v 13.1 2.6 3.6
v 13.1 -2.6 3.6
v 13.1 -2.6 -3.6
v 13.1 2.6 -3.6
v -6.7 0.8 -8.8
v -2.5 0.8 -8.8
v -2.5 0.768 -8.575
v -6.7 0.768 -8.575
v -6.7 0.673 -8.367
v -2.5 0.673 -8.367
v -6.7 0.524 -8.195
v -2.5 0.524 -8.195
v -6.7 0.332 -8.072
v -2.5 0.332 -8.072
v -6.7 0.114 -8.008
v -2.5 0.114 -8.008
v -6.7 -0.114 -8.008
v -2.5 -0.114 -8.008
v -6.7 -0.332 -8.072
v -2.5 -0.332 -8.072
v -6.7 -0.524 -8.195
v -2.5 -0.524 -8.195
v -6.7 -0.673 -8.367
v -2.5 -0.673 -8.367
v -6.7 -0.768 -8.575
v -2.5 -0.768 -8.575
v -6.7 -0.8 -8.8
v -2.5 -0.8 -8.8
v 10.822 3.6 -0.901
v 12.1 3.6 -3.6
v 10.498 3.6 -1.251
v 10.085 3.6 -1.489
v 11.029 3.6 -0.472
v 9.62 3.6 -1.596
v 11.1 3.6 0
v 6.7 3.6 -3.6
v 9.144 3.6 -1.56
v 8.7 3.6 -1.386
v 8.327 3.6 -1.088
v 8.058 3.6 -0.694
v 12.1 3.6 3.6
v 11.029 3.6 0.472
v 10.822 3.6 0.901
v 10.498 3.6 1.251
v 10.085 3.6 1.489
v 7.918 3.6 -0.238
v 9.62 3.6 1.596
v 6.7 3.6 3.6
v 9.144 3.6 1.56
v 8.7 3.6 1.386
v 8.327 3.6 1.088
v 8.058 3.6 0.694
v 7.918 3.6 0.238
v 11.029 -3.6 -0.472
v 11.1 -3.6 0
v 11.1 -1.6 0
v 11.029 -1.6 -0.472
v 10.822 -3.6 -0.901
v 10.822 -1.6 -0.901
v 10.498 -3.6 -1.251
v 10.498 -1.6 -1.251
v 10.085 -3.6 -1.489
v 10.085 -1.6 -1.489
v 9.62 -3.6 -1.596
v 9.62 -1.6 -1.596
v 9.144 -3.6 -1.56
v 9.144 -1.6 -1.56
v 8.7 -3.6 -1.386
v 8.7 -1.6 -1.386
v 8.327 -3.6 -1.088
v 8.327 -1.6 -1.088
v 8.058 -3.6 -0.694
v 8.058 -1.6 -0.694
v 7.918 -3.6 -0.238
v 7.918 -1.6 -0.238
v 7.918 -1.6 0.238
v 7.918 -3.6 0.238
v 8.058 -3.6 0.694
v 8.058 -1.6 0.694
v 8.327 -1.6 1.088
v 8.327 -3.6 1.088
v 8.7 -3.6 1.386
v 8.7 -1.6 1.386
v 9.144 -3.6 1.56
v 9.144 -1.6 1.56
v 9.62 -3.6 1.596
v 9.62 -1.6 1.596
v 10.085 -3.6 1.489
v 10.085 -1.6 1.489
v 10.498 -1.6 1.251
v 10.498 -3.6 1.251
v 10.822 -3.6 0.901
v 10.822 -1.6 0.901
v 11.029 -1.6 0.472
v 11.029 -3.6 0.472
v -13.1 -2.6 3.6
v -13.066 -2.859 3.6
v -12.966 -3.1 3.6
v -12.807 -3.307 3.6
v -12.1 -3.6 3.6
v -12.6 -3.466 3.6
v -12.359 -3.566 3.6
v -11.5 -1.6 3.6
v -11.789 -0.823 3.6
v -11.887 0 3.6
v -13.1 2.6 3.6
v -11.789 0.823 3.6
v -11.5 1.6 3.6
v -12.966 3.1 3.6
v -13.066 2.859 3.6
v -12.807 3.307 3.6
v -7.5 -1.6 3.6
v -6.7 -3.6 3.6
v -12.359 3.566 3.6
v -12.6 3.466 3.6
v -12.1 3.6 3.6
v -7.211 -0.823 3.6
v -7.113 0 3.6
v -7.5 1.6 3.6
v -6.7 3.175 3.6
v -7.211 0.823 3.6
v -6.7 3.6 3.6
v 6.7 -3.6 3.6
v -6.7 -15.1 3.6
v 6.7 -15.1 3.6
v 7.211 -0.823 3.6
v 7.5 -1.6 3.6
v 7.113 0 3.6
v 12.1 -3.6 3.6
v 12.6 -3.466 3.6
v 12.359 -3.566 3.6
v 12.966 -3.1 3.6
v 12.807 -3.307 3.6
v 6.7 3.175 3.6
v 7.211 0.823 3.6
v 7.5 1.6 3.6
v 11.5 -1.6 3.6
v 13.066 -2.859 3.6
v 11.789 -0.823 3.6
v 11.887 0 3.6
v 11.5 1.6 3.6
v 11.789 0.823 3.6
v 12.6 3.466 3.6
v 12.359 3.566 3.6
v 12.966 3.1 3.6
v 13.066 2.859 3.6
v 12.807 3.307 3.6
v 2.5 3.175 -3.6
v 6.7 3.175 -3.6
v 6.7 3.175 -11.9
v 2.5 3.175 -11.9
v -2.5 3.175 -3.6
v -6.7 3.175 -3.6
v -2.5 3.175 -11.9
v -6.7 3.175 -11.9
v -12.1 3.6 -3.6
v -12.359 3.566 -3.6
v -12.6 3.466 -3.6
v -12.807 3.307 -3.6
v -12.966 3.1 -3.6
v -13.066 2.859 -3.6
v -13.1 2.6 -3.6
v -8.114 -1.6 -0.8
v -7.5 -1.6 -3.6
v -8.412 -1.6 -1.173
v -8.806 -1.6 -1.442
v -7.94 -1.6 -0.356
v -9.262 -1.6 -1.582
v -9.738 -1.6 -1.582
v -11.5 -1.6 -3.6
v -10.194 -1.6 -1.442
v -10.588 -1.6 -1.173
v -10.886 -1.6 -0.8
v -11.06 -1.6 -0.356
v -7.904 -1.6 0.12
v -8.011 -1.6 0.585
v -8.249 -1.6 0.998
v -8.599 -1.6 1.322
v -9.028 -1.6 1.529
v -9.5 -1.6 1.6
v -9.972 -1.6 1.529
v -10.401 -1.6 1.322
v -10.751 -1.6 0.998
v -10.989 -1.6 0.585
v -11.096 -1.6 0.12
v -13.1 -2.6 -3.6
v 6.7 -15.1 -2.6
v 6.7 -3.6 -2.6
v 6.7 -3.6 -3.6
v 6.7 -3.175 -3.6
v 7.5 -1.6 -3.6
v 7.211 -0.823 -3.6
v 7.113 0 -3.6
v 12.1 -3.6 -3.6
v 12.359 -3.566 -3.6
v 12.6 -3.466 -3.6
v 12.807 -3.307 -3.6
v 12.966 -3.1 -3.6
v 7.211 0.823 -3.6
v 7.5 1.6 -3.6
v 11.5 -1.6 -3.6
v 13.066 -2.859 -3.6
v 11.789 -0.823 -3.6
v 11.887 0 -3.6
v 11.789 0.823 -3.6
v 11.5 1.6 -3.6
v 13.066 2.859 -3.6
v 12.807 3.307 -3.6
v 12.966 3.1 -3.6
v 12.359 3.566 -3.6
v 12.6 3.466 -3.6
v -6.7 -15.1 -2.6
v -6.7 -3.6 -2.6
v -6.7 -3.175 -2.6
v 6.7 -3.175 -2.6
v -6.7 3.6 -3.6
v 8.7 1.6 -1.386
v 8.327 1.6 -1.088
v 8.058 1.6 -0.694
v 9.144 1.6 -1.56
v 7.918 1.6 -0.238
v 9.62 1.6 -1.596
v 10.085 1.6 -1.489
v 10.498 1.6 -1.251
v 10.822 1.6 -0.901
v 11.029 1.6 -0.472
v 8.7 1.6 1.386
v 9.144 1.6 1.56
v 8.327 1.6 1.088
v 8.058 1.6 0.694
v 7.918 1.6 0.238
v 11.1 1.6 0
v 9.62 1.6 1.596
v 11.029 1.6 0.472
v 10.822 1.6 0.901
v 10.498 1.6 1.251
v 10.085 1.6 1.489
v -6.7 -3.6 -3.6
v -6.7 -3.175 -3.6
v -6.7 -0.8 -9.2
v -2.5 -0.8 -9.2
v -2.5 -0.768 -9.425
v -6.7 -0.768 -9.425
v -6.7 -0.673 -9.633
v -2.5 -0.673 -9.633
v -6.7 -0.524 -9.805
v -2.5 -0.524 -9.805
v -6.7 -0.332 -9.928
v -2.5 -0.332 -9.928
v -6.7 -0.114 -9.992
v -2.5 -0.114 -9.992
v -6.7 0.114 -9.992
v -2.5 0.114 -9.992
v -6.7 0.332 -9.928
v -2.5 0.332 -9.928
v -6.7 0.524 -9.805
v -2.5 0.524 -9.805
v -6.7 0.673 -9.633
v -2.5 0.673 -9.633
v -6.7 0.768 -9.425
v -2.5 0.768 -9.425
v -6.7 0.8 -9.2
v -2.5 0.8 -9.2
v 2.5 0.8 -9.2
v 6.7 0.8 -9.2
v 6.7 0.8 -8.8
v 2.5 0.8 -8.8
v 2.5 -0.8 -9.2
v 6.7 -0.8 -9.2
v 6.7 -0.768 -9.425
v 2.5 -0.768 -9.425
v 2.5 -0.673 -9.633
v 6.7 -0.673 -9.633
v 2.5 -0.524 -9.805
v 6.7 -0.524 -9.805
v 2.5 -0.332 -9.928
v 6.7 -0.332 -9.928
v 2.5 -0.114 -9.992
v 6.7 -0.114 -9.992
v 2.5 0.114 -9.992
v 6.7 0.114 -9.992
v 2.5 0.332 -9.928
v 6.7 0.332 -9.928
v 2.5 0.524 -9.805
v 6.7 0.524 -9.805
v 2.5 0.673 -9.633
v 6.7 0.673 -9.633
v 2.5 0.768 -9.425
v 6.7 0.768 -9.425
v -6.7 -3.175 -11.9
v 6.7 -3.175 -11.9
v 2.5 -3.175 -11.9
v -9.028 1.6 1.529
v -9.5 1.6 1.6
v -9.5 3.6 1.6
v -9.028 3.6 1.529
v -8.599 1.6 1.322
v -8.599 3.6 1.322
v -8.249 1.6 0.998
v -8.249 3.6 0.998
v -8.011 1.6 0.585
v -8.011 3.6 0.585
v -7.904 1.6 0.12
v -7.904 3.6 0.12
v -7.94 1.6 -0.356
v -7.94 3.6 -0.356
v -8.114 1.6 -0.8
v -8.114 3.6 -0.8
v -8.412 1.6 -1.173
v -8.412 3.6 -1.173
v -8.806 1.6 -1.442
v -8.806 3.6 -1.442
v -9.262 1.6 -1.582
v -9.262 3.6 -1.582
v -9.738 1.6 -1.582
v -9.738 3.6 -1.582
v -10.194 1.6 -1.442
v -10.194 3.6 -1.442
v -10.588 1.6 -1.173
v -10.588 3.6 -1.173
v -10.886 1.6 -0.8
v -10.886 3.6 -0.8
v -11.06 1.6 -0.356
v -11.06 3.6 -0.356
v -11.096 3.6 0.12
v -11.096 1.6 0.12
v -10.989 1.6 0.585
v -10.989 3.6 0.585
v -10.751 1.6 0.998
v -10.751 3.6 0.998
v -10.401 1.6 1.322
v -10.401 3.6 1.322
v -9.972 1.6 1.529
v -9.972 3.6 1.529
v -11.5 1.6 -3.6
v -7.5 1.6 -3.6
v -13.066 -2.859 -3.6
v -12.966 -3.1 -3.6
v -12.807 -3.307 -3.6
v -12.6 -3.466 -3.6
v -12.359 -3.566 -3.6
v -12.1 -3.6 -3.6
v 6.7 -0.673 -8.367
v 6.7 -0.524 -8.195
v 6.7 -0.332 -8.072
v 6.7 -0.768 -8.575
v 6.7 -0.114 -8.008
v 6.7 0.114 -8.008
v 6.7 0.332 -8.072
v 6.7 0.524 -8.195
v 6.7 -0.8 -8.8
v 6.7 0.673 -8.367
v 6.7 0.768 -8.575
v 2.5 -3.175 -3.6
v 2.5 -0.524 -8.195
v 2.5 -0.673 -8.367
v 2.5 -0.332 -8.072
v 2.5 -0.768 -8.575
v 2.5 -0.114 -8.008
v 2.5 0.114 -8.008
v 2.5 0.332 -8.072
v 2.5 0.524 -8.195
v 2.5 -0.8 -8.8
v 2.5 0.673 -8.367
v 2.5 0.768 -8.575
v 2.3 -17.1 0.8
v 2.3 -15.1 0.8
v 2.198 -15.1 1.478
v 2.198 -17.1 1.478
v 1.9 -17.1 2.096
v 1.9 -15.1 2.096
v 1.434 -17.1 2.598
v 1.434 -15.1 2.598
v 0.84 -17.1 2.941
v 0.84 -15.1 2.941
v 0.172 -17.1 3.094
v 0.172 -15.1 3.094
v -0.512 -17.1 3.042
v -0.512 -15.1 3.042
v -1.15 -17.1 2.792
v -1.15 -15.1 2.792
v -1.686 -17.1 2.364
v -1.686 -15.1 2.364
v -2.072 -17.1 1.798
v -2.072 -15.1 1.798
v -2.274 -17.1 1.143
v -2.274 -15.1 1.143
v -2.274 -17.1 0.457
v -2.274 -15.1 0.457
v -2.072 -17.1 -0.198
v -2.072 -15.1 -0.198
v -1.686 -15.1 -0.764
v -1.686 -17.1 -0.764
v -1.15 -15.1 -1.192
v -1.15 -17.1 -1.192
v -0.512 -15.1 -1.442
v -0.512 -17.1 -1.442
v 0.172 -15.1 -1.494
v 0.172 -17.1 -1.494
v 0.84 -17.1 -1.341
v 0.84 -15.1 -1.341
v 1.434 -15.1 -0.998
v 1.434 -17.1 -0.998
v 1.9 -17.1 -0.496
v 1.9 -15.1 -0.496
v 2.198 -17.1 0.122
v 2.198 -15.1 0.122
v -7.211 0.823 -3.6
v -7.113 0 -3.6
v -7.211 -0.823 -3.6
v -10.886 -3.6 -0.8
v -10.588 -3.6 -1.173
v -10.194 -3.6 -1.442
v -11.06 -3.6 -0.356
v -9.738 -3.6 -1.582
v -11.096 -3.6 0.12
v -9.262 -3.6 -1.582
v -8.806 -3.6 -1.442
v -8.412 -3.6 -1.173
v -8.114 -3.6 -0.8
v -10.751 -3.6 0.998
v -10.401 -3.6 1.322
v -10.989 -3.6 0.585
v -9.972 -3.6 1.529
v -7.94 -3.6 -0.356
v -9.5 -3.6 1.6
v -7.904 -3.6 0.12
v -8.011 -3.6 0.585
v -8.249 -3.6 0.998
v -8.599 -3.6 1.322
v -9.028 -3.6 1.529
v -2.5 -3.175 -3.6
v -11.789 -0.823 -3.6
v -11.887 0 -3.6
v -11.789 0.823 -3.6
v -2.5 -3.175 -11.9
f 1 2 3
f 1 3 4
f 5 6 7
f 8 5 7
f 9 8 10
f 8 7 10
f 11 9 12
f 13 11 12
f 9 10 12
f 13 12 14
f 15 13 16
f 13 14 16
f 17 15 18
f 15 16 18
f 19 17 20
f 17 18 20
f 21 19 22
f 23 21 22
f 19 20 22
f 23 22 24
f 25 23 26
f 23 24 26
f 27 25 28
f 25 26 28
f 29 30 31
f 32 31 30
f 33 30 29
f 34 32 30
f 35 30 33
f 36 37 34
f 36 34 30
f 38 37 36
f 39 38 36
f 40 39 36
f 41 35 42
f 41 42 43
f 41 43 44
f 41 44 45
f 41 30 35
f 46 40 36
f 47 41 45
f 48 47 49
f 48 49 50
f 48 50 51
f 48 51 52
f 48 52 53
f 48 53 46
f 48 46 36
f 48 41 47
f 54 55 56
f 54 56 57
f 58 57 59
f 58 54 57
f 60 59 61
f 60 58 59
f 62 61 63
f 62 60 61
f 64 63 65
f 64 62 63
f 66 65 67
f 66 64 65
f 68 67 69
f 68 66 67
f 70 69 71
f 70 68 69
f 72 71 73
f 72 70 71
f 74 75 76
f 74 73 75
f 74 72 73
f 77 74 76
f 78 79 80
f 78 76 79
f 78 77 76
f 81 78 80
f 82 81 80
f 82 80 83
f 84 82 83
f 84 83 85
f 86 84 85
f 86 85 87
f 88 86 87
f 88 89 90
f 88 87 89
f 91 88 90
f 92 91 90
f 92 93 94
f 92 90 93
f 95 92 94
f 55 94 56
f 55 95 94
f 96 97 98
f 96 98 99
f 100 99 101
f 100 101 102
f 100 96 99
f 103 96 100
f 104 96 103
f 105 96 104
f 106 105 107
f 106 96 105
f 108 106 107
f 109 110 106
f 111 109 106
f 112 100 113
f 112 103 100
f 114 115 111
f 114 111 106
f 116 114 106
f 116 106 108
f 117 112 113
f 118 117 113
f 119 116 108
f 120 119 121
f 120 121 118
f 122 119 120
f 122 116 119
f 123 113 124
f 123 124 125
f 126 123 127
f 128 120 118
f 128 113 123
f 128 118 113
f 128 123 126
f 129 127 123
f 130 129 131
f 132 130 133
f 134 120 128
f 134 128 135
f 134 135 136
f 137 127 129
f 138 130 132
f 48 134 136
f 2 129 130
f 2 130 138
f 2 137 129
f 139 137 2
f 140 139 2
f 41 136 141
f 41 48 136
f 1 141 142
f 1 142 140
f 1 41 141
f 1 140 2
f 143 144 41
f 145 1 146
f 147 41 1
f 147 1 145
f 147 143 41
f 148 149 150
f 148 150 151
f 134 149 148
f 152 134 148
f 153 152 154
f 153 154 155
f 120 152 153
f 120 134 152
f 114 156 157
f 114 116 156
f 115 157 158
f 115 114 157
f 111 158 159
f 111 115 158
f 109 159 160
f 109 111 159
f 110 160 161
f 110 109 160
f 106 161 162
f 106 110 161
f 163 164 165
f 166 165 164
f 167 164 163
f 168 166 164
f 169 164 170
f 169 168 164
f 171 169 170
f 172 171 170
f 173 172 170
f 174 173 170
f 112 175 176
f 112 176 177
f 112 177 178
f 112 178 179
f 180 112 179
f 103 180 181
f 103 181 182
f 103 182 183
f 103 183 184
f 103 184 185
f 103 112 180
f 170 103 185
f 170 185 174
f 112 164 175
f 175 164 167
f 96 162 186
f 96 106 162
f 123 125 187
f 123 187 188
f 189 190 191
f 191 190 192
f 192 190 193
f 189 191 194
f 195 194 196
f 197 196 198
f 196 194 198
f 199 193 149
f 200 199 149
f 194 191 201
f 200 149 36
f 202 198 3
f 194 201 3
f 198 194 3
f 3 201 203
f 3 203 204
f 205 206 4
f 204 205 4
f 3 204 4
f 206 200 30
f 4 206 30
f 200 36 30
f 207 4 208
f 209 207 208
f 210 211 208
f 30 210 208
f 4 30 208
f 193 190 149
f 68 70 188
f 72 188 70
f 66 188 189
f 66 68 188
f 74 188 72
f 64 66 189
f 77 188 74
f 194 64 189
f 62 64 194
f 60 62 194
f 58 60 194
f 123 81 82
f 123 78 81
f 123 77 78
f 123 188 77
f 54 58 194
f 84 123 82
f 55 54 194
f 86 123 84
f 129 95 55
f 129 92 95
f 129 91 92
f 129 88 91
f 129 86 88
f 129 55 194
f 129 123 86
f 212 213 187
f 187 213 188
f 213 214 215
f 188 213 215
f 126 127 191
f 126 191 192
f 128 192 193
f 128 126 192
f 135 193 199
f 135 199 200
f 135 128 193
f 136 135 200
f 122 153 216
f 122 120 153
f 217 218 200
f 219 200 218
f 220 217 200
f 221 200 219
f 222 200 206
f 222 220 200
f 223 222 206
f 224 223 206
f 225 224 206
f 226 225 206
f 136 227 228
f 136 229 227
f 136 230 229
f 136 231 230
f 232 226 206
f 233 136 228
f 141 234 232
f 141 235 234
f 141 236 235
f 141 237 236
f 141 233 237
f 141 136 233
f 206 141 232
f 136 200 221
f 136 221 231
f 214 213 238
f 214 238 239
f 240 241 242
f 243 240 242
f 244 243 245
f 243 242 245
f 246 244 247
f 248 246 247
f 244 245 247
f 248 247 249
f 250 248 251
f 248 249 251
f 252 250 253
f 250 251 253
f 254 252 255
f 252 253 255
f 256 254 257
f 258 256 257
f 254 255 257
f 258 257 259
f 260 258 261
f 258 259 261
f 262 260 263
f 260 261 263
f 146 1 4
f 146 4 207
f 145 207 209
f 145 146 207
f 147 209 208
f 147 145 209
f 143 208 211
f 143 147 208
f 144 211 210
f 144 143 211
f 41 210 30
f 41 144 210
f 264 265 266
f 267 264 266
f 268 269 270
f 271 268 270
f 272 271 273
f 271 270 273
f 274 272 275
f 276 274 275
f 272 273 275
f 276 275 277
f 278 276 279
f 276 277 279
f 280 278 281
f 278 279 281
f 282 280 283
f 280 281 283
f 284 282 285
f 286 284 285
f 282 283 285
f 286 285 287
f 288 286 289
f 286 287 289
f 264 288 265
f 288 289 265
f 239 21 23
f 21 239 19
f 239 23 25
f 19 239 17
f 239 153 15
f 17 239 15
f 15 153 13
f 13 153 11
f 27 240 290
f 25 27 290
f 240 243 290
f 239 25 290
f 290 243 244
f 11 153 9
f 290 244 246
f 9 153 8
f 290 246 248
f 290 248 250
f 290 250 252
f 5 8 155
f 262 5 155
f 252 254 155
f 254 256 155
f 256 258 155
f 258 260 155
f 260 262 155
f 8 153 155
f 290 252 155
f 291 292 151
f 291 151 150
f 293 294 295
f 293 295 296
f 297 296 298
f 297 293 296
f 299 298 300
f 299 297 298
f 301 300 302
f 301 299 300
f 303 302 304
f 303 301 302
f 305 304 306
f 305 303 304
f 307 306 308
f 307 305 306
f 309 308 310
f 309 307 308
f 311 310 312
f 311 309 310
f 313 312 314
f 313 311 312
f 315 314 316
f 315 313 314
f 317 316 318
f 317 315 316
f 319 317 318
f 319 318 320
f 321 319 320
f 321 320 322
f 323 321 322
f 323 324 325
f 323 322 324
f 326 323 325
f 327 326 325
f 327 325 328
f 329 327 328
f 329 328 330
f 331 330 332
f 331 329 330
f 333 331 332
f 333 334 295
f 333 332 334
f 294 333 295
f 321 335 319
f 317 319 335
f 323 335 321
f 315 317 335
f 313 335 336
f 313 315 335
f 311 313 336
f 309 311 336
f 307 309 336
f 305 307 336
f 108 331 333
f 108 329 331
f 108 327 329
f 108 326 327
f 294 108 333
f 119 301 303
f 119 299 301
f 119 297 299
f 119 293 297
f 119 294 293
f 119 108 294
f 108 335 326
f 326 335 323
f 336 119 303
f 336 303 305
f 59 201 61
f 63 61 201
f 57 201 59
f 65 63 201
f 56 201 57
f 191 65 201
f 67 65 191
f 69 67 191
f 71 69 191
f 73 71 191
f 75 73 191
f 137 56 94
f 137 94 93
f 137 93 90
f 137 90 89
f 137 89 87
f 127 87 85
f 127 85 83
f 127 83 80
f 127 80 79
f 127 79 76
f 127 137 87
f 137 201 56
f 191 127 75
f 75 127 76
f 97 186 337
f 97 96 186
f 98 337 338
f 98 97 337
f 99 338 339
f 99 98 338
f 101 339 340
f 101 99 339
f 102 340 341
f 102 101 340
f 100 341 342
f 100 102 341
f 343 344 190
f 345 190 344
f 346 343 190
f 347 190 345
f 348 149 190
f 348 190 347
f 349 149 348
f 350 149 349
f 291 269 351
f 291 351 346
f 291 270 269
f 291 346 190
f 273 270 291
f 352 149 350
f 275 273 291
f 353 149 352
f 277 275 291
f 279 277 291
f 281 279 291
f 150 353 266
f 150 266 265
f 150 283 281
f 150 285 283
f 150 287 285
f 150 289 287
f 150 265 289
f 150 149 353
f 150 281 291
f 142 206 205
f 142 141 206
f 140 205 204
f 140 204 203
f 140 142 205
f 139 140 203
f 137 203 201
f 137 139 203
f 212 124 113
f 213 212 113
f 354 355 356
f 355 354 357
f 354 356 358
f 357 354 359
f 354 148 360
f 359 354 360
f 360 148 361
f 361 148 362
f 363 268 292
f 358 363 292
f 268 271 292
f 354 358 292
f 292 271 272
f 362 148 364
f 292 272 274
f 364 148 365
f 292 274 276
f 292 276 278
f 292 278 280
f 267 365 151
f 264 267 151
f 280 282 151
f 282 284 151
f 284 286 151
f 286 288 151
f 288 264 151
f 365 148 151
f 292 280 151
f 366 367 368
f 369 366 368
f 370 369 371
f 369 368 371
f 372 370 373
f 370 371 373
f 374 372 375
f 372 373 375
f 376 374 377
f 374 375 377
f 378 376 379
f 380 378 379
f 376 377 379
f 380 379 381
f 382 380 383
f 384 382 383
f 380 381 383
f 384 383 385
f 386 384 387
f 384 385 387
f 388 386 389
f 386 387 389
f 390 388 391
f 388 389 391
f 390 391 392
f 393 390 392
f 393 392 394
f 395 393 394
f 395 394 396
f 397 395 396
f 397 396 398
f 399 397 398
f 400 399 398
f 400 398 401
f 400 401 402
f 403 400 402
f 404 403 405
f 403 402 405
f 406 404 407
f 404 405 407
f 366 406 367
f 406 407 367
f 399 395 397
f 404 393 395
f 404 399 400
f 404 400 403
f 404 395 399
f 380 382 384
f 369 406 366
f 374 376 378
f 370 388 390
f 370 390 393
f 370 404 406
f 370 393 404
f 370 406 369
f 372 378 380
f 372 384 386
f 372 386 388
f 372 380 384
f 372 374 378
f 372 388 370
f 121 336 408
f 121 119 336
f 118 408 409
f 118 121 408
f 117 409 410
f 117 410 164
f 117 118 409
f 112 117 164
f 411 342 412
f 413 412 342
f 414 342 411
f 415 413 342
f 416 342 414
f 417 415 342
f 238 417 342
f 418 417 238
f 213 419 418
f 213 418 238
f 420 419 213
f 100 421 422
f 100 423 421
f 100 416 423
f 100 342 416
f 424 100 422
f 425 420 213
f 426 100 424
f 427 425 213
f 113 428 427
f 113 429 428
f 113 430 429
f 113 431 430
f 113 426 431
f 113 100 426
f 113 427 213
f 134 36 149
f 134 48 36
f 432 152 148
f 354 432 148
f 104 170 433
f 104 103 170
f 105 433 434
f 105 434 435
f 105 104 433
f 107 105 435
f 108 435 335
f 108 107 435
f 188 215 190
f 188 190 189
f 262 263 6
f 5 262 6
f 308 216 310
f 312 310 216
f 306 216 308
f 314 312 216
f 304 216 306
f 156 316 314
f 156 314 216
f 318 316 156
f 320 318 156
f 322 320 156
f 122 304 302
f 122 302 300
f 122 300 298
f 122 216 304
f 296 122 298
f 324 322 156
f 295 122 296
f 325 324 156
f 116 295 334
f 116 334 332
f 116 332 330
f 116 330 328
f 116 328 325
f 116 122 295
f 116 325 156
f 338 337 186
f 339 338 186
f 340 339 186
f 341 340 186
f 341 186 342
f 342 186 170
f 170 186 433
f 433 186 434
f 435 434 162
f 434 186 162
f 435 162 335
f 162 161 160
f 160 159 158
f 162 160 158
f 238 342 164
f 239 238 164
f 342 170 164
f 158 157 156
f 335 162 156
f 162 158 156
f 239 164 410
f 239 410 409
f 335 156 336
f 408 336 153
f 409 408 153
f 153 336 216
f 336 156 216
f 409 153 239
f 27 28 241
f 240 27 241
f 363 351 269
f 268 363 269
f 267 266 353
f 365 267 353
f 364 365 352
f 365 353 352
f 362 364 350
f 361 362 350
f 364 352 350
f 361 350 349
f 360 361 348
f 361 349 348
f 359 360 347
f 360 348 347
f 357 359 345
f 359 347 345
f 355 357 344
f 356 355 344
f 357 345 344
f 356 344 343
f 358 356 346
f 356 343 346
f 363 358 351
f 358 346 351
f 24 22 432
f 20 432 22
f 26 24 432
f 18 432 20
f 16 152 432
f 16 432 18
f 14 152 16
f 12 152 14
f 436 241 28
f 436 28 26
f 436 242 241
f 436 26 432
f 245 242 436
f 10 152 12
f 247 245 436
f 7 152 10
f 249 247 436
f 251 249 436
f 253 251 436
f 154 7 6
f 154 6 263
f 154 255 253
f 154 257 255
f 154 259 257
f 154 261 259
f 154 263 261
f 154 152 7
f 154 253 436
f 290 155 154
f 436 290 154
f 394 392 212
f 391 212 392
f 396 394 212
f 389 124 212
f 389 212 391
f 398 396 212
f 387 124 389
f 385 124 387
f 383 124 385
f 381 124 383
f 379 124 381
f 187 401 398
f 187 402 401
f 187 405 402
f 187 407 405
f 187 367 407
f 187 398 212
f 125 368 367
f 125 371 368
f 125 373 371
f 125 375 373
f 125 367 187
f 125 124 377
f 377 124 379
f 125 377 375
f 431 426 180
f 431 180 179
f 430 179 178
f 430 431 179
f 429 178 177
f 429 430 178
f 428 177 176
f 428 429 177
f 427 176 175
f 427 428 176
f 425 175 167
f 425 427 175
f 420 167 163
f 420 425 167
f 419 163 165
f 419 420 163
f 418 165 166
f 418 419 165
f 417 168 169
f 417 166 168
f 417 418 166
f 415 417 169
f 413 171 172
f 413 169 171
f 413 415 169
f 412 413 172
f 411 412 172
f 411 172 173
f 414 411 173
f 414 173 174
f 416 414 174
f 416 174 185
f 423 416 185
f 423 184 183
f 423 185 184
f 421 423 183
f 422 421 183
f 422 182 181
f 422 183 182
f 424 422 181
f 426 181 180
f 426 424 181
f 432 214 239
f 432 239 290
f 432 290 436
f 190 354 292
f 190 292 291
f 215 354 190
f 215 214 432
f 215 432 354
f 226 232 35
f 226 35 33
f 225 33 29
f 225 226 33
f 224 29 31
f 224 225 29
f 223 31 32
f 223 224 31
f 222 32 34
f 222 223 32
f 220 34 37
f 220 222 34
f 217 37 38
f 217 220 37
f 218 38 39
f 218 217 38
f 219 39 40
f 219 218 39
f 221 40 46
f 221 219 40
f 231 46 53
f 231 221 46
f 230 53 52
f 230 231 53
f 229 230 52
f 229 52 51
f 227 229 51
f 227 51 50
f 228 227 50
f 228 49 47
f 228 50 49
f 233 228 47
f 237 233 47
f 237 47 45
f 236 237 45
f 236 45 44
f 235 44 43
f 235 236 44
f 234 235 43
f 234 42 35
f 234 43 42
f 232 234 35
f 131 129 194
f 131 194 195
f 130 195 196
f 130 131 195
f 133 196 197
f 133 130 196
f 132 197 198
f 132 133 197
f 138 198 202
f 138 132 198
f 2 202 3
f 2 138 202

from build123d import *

# Parameters (mm, degrees)
EXTRUDE_1_DEPTH          = 3.6
EXTRUDE_START            = -0.425
SKETCH_2_W               = 4.2
SKETCH_2_H               = 9
EXTRUDE_2_DEPTH          = 6.35
CUT_EXTRUDE_1_DEPTH      = 20.106543382
CUT_EXTRUDE_1_DEPTH_BACK = 20.106543382
SKETCH_2_3_R             = 1.6
SKETCH_5_W               = 13.4
SKETCH_5_H               = 11.925
EXTRUDE_3_DEPTH          = 6.2
SKETCH_6_R               = 2.3
EXTRUDE_4_DEPTH          = 2
CUT_EXTRUDE_2_DEPTH      = 29.741259541
CUT_EXTRUDE_2_DEPTH_BACK = 29.741259541


with BuildPart() as part:
    # 草图1 → 凸台-拉伸1 (new, symmetric)
    with BuildSketch(Plane.XY):
        with BuildLine():
            Line((-12.1, -3.6), (-6.7, -3.6))
            Line((-6.7, -3.6), (-6.7, -3.175))
            Line((-6.7, -3.175), (6.7, -3.175))
            Line((6.7, -3.175), (6.7, -3.6))
            Line((6.7, -3.6), (12.1, -3.6))
            ThreePointArc((12.1, -3.6), (12.807106781, -3.307106781), (13.1, -2.6))
            Line((13.1, -2.6), (13.1, 2.6))
            ThreePointArc((13.1, 2.6), (12.807106781, 3.307106781), (12.1, 3.6))
            Line((12.1, 3.6), (6.7, 3.6))
            Line((6.7, 3.6), (6.7, 3.175))
            Line((6.7, 3.175), (-6.7, 3.175))
            Line((-6.7, 3.175), (-6.7, 3.6))
            Line((-6.7, 3.6), (-12.1, 3.6))
            ThreePointArc((-12.1, 3.6), (-12.807106781, 3.307106781), (-13.1, 2.6))
            Line((-13.1, 2.6), (-13.1, -2.6))
            ThreePointArc((-13.1, -2.6), (-12.807106781, -3.307106781), (-12.1, -3.6))
        make_face()
        with BuildLine():
            Line((11.5, -1.6), (7.5, -1.6))
            ThreePointArc((7.5, -1.6), (7.112876483, 0), (7.5, 1.6))
            Line((7.5, 1.6), (11.5, 1.6))
            ThreePointArc((11.5, 1.6), (11.887123517, 0), (11.5, -1.6))
        make_face(mode=Mode.SUBTRACT)
        with BuildLine():
            Line((-11.5, 1.6), (-7.5, 1.6))
            ThreePointArc((-7.5, 1.6), (-7.112876483, 0), (-7.5, -1.6))
            Line((-7.5, -1.6), (-11.5, -1.6))
            ThreePointArc((-11.5, -1.6), (-11.887123517, 0), (-11.5, 1.6))
        make_face(mode=Mode.SUBTRACT)
    extrude(amount=EXTRUDE_1_DEPTH, both=True)

    # 草图2 → 凸台-拉伸2 (add)
    with BuildSketch(Plane(origin=(0, 3.6, 0), x_dir=(1, 0, 0), z_dir=(0, 1, 0)).offset(EXTRUDE_START)):
        with Locations((4.6, 7.4)):
            Rectangle(SKETCH_2_W, SKETCH_2_H)
        with Locations((-4.6, 7.4)):
            Rectangle(SKETCH_2_W, SKETCH_2_H)
    extrude(amount=-EXTRUDE_2_DEPTH)

    # 草图2<3> → 切除-拉伸1 (cut, two sides: drawn at the far end of the back side and taken through both)
    with BuildSketch(Plane(origin=(0, 3.6, 0), x_dir=(1, 0, 0), z_dir=(0, 1, 0)).offset(-CUT_EXTRUDE_1_DEPTH_BACK)):
        with Locations((-9.5, 0)):
            Circle(SKETCH_2_3_R)
        with Locations((9.5, 0)):
            Circle(SKETCH_2_3_R)
    extrude(amount=CUT_EXTRUDE_1_DEPTH + CUT_EXTRUDE_1_DEPTH_BACK, mode=Mode.SUBTRACT)

    # 草图5 → 凸台-拉伸3 (add)
    with BuildSketch(Plane.XY.offset(3.6)):
        with Locations((0, -9.1375)):
            Rectangle(SKETCH_5_W, SKETCH_5_H)
    extrude(amount=-EXTRUDE_3_DEPTH)

    # 草图6 → 凸台-拉伸4 (add)
    with BuildSketch(Plane.XZ.offset(15.1)):
        with Locations((0, 0.8)):
            Circle(SKETCH_6_R)
    extrude(amount=EXTRUDE_4_DEPTH)

    # 草图7 → 切除-拉伸2 (cut, two sides: drawn at the far end of the back side and taken through both)
    with BuildSketch(Plane.ZY.offset(6.7).offset(-CUT_EXTRUDE_2_DEPTH_BACK)):
        with BuildLine():
            Line((-8.8, -0.8), (-9.2, -0.8))
            ThreePointArc((-9.2, -0.8), (-10, 0), (-9.2, 0.8))
            Line((-9.2, 0.8), (-8.8, 0.8))
            ThreePointArc((-8.8, 0.8), (-8, 0), (-8.8, -0.8))
        make_face()
    extrude(amount=CUT_EXTRUDE_2_DEPTH + CUT_EXTRUDE_2_DEPTH_BACK, mode=Mode.SUBTRACT)


solid = part.part
